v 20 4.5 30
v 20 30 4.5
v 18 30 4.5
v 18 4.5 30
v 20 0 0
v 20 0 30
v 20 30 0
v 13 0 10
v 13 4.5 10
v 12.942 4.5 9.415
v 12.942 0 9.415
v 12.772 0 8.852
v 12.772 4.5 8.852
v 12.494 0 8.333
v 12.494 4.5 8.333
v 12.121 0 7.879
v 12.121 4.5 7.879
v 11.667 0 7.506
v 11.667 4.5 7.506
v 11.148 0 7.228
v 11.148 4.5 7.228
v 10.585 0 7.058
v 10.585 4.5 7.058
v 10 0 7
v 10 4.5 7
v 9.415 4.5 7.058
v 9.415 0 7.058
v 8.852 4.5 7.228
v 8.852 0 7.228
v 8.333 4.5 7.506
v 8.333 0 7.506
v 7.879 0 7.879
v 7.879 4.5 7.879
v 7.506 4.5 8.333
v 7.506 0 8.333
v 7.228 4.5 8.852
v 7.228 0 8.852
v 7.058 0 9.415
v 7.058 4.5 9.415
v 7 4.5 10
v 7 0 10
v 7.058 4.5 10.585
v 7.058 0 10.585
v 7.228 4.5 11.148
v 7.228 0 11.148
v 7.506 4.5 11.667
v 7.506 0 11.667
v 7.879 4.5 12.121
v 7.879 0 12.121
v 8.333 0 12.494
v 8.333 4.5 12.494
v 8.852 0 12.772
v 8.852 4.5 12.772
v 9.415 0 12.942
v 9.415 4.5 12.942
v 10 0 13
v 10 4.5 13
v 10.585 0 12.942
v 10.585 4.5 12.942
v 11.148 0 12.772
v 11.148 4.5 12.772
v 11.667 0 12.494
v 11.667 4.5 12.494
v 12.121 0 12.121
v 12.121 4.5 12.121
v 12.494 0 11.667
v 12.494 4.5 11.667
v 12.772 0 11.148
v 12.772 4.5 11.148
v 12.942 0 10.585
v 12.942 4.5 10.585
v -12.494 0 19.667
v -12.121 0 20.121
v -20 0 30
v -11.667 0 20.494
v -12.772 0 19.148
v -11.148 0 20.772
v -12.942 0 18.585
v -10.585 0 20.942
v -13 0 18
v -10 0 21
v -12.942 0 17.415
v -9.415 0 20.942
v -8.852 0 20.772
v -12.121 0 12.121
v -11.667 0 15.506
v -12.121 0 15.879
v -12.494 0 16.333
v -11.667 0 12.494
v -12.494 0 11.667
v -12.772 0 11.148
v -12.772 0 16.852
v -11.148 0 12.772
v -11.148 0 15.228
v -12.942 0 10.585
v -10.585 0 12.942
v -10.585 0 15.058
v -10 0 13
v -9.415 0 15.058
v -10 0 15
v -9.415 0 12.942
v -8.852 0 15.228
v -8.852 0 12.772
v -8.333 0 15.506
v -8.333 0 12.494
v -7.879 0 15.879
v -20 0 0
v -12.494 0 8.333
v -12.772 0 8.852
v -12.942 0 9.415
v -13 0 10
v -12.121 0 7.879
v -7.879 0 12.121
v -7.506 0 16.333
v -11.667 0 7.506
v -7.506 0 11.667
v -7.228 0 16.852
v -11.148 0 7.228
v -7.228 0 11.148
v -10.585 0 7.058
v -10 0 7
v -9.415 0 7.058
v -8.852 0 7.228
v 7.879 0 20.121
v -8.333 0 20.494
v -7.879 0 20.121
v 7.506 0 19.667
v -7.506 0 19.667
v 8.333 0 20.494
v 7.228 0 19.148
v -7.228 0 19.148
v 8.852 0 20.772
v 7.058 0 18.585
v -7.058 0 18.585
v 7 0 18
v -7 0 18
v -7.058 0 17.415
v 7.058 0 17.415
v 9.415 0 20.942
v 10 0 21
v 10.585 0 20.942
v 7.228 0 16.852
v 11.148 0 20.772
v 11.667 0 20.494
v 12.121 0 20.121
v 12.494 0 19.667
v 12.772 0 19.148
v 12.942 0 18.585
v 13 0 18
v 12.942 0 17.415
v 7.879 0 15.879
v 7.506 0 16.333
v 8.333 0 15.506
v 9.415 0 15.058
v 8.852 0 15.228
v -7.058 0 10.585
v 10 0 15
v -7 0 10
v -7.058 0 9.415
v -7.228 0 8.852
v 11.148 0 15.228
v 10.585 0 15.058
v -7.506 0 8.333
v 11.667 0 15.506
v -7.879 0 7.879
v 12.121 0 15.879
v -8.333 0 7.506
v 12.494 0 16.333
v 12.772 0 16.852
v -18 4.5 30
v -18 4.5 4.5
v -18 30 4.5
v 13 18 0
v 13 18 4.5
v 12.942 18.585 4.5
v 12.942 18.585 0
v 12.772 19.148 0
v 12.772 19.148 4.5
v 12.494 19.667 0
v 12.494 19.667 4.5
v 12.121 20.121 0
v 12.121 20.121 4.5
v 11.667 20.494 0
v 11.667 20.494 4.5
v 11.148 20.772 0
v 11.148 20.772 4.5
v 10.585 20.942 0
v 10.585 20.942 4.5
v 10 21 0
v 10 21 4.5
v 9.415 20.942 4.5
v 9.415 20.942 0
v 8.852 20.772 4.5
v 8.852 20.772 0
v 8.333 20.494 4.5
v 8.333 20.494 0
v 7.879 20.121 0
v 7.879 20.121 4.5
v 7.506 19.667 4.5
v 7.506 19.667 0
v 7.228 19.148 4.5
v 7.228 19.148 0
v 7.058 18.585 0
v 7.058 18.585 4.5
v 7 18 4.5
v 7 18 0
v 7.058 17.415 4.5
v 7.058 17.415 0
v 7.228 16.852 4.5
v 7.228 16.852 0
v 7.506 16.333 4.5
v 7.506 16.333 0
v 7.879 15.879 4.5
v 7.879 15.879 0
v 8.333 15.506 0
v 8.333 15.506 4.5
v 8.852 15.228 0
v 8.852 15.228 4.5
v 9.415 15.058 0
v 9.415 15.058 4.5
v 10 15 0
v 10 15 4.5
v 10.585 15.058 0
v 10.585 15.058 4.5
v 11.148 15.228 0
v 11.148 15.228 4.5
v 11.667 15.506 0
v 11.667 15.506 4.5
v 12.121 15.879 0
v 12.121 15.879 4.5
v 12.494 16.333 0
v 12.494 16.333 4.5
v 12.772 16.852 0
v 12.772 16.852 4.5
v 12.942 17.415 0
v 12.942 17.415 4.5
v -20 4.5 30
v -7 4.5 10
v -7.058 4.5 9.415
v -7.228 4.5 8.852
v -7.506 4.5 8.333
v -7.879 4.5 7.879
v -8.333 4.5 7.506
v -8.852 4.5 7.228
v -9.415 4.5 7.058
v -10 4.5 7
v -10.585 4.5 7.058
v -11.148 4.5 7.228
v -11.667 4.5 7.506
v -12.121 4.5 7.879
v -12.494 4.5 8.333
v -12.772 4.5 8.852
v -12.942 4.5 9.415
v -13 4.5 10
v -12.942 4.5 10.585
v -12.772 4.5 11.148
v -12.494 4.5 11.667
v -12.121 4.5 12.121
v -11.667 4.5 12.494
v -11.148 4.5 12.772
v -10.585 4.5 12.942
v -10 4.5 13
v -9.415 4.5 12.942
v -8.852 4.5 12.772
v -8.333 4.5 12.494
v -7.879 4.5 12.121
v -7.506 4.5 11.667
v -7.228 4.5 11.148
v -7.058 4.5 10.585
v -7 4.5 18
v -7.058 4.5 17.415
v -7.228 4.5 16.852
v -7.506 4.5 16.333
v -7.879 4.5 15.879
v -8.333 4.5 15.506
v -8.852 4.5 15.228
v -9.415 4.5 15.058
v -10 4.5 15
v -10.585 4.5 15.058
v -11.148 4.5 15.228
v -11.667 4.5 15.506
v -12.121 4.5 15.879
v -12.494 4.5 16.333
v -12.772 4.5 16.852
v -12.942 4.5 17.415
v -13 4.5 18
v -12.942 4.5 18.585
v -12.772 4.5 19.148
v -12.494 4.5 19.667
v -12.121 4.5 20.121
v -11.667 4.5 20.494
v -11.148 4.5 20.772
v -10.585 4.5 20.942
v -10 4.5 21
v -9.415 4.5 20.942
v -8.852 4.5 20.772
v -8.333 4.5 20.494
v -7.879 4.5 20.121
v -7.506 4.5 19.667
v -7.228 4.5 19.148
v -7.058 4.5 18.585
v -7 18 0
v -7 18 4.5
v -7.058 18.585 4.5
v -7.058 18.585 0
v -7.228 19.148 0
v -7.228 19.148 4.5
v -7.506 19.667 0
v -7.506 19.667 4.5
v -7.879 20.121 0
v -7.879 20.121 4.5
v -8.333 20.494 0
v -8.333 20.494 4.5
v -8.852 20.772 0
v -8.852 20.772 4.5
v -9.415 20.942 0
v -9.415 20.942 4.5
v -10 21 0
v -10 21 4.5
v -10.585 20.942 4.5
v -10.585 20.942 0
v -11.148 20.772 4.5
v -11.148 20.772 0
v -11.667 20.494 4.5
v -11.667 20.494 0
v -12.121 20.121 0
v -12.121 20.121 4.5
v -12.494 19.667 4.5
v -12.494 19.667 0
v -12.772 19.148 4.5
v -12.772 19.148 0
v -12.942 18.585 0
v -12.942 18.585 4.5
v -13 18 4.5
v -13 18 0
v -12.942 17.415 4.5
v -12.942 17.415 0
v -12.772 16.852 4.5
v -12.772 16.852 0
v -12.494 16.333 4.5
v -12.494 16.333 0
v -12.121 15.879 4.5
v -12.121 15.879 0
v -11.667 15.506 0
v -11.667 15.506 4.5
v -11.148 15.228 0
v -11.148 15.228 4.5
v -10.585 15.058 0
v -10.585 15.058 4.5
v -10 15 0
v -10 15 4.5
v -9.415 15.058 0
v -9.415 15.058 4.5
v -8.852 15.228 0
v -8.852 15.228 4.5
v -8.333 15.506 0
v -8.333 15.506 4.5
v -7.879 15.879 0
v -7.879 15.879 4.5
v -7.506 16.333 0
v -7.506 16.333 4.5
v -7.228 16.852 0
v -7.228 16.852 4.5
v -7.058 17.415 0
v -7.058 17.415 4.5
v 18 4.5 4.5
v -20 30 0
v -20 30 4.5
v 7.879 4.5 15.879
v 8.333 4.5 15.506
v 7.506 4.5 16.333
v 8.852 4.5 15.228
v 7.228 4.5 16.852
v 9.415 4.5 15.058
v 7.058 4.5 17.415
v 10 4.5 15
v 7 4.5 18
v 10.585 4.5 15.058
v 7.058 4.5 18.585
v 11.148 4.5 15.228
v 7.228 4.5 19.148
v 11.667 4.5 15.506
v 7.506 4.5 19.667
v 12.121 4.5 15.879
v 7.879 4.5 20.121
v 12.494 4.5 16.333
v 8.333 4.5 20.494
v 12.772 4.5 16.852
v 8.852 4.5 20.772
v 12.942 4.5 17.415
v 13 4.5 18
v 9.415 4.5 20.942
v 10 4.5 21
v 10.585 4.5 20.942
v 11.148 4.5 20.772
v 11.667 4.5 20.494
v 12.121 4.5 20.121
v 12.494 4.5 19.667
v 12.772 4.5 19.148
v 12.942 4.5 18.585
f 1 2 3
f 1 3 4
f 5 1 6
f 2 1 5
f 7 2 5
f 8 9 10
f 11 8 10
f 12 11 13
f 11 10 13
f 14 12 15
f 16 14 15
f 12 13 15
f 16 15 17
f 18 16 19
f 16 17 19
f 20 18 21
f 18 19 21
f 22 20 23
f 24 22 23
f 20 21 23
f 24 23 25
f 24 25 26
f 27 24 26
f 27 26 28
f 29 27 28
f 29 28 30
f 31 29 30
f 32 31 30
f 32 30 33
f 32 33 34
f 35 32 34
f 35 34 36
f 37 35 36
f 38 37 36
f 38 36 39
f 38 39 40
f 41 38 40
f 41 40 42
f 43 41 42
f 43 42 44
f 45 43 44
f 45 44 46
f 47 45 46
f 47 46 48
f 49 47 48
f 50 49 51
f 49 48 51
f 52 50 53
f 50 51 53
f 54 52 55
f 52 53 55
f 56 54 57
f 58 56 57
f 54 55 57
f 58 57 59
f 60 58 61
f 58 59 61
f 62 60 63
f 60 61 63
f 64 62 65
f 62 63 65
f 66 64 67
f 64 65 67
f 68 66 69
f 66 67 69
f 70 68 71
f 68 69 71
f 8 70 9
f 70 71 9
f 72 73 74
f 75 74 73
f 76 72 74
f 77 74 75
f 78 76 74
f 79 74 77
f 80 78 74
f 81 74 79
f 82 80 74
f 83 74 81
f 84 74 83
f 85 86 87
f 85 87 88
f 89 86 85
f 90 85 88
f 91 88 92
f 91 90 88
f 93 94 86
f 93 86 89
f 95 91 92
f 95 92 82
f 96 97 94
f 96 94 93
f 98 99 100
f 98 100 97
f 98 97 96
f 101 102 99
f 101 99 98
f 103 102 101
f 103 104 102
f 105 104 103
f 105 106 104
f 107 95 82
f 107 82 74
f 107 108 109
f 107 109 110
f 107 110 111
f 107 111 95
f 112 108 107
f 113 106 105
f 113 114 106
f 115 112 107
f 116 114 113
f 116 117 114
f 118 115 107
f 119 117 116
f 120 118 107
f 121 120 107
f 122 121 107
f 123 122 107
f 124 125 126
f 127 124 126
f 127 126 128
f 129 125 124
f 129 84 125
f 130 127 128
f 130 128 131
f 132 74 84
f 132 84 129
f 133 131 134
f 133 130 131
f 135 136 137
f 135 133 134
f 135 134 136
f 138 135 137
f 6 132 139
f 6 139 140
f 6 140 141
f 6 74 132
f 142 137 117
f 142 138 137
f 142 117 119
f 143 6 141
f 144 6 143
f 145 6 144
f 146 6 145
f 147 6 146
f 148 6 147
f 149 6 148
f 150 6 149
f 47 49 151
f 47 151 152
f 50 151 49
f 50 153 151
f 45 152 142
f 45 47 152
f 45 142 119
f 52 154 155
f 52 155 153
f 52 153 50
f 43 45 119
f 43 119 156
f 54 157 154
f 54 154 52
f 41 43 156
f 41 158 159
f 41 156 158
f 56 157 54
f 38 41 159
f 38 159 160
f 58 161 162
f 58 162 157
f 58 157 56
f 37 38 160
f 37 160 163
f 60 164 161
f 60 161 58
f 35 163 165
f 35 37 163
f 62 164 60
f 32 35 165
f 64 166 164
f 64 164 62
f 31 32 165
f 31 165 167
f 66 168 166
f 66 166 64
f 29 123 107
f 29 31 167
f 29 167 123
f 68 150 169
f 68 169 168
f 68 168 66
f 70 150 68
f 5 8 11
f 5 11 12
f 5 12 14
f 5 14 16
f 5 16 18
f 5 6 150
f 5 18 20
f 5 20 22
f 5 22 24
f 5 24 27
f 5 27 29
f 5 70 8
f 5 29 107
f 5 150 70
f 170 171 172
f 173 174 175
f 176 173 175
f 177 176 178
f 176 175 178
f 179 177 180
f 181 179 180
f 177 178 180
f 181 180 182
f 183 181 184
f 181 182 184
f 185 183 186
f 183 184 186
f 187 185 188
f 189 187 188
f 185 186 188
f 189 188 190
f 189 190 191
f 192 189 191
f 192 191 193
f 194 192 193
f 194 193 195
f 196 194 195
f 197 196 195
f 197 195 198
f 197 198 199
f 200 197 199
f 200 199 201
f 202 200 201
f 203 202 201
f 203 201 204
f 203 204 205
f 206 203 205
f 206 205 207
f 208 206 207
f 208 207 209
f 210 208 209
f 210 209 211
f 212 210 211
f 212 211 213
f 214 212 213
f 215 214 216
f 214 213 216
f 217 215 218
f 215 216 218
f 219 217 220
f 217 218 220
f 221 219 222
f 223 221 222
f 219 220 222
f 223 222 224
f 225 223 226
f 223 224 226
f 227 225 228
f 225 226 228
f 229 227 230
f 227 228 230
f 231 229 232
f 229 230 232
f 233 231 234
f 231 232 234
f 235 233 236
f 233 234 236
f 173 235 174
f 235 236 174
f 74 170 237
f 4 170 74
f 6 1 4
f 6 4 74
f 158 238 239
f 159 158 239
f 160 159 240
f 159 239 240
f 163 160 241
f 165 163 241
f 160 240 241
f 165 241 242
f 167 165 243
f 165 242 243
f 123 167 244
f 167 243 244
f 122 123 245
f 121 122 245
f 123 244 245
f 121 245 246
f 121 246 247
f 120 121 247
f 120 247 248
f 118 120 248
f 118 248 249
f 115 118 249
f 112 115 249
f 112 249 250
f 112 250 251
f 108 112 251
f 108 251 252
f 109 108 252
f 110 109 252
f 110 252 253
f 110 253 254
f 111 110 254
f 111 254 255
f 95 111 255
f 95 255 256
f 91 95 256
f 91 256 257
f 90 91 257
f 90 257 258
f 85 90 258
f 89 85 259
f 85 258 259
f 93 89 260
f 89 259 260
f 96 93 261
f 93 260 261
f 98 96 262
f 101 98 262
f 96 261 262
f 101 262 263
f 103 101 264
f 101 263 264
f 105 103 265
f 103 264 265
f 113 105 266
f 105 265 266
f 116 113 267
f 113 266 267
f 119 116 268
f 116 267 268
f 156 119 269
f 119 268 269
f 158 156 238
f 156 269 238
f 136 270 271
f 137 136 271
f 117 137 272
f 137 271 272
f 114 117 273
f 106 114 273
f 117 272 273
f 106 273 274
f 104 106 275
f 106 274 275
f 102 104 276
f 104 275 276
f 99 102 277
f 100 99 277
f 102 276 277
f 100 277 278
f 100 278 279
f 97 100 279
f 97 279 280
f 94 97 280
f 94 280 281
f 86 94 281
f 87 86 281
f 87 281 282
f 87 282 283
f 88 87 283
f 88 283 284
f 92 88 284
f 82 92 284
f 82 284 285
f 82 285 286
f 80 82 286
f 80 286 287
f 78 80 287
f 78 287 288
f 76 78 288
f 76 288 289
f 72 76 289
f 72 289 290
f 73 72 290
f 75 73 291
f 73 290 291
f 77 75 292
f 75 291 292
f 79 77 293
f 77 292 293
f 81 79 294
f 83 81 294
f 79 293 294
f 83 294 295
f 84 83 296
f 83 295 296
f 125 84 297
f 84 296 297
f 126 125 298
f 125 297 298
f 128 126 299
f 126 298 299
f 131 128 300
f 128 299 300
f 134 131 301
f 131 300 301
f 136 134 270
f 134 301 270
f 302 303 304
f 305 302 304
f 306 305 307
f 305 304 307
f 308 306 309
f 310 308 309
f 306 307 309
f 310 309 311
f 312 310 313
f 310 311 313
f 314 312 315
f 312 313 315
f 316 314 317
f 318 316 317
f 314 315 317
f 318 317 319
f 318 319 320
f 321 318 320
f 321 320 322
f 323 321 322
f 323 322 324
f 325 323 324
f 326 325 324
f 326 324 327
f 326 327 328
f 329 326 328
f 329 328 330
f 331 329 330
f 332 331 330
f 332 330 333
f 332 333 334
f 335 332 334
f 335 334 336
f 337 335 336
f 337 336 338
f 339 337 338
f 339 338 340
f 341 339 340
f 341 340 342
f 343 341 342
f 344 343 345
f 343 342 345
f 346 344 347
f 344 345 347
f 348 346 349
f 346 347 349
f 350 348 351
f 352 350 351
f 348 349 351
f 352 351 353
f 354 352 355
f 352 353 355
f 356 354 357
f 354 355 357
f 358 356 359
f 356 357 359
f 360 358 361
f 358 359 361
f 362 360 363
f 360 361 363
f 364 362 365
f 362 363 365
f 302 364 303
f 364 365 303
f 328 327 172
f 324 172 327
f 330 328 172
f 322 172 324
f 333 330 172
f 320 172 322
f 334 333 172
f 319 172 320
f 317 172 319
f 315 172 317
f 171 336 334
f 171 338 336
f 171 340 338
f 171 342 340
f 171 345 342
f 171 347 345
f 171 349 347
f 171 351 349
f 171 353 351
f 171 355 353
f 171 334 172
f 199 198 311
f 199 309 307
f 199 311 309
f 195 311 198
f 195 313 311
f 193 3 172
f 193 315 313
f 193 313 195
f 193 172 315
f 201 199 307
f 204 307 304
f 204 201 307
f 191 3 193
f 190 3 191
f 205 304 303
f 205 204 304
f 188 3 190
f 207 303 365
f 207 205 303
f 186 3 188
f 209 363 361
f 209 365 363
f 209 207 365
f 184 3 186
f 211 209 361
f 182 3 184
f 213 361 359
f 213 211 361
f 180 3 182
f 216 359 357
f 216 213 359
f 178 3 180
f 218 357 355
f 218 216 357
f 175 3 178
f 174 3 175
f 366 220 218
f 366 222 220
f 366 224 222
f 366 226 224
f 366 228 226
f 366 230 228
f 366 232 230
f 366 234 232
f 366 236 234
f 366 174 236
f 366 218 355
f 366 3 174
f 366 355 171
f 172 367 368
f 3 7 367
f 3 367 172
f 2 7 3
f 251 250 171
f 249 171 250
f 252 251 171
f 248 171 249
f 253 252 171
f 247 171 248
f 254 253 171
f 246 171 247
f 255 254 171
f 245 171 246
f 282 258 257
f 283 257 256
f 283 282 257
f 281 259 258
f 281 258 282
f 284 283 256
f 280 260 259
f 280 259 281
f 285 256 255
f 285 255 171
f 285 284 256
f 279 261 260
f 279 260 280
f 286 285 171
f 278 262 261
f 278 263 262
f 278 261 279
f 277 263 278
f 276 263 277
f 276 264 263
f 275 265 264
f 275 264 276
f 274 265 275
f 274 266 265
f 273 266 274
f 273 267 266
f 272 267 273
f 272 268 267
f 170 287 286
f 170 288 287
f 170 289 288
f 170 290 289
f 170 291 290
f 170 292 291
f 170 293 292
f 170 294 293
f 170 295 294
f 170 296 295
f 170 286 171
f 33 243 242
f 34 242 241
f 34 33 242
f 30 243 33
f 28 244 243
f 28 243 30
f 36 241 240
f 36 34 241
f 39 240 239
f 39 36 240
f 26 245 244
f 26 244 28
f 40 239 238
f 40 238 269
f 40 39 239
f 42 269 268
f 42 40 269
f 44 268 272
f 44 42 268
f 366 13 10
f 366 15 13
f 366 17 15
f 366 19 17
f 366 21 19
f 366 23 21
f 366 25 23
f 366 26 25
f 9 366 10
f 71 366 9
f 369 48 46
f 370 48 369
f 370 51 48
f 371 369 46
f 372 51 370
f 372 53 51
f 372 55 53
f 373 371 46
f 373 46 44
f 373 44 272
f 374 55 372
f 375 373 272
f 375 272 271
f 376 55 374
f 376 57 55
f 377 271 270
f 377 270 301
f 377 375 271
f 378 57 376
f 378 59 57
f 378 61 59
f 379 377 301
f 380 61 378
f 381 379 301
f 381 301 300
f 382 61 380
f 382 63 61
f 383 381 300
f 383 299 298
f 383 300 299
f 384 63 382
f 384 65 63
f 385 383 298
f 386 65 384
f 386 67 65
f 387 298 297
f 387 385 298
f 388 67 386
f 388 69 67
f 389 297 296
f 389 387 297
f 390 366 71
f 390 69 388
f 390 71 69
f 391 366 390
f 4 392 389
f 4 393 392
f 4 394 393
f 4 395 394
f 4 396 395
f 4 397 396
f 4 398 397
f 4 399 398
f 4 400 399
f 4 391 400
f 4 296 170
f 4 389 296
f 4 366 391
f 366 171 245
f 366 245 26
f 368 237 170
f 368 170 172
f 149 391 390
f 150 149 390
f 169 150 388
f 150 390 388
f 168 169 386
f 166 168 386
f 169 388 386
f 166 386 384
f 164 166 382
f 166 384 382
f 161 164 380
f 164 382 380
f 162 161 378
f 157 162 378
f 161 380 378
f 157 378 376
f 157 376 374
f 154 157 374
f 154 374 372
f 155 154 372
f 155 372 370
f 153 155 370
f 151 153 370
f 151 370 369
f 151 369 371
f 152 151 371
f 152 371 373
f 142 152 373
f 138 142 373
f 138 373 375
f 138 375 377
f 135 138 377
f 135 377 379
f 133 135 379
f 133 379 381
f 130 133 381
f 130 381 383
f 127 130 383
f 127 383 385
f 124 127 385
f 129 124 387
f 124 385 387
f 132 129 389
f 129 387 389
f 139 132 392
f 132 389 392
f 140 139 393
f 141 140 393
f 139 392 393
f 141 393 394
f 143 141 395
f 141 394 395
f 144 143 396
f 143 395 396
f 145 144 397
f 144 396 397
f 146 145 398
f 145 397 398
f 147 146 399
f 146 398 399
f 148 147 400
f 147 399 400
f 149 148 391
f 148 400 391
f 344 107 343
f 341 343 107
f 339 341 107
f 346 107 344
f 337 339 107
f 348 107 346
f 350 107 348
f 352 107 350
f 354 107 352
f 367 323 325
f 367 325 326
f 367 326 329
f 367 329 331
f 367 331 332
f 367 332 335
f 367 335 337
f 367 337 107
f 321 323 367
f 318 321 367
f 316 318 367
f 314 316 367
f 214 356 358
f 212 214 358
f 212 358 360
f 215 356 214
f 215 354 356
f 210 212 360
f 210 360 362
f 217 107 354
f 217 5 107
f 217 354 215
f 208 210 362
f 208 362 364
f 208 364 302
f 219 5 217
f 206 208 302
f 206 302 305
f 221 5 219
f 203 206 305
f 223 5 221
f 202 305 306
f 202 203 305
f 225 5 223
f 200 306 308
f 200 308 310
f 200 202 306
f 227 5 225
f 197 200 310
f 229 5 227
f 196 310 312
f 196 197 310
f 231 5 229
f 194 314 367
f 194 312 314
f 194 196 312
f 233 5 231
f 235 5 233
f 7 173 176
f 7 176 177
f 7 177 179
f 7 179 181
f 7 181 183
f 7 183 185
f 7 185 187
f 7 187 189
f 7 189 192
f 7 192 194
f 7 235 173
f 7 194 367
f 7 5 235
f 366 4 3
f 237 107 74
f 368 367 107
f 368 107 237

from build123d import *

# Parameters (mm, degrees)
BOSS_EXTRUDE1_DEPTH = 20
SKETCH2_R           = 3
CUT_EXTRUDE1_DEPTH  = 5.5
SKETCH3_R           = 3
CUT_EXTRUDE2_DEPTH  = 5.5
BOSS_EXTRUDE2_DEPTH = 2
BOSS_EXTRUDE3_DEPTH = 2


with BuildPart() as part:
    # Sketch1 → Boss-Extrude1 (new body, symmetric)
    with BuildSketch(Plane(origin=(0, 0, 0), x_dir=(0, 0, -1), z_dir=(1, 0, 0))):
        Polygon((0, 0), (0, 30), (-4.5, 30), (-4.5, 4.5), (-30, 4.5), (-30, 0), align=None)
    extrude(amount=BOSS_EXTRUDE1_DEPTH, both=True)

    # Sketch2 → Cut-Extrude1 (cut, through all)
    with BuildSketch(Plane.XY.offset(4.5)):
        with Locations((-10, 18)):
            Circle(SKETCH2_R)
        with Locations((10, 18)):
            Circle(SKETCH2_R)
    extrude(amount=-CUT_EXTRUDE1_DEPTH, mode=Mode.SUBTRACT)

    # Sketch3 → Cut-Extrude2 (cut, through all)
    with BuildSketch(Plane(origin=(0, 4.5, 0), x_dir=(1, 0, 0), z_dir=(0, 1, 0))):
        with Locations((-10, -10)):
            Circle(SKETCH3_R)
        with Locations((-10, -18)):
            Circle(SKETCH3_R)
        with Locations((10, -10)):
            Circle(SKETCH3_R)
        with Locations((10, -18)):
            Circle(SKETCH3_R)
    extrude(amount=-CUT_EXTRUDE2_DEPTH, mode=Mode.SUBTRACT)

    # Sketch4 → Boss-Extrude2 (add)
    with BuildSketch(Plane(origin=(20, 0, 0), x_dir=(0, 0, -1), z_dir=(1, 0, 0))):
        Polygon((0, 0), (0, 30), (-4.5, 30), (-30, 4.5), (-30, 0), align=None)
    extrude(amount=-BOSS_EXTRUDE2_DEPTH)

    # Sketch5 → Boss-Extrude3 (add)
    with BuildSketch(Plane.ZY.offset(20)):
        Polygon((30, 4.5), (4.5, 30), (4.5, 4.5), align=None)
    extrude(amount=-BOSS_EXTRUDE3_DEPTH)


solid = part.part
